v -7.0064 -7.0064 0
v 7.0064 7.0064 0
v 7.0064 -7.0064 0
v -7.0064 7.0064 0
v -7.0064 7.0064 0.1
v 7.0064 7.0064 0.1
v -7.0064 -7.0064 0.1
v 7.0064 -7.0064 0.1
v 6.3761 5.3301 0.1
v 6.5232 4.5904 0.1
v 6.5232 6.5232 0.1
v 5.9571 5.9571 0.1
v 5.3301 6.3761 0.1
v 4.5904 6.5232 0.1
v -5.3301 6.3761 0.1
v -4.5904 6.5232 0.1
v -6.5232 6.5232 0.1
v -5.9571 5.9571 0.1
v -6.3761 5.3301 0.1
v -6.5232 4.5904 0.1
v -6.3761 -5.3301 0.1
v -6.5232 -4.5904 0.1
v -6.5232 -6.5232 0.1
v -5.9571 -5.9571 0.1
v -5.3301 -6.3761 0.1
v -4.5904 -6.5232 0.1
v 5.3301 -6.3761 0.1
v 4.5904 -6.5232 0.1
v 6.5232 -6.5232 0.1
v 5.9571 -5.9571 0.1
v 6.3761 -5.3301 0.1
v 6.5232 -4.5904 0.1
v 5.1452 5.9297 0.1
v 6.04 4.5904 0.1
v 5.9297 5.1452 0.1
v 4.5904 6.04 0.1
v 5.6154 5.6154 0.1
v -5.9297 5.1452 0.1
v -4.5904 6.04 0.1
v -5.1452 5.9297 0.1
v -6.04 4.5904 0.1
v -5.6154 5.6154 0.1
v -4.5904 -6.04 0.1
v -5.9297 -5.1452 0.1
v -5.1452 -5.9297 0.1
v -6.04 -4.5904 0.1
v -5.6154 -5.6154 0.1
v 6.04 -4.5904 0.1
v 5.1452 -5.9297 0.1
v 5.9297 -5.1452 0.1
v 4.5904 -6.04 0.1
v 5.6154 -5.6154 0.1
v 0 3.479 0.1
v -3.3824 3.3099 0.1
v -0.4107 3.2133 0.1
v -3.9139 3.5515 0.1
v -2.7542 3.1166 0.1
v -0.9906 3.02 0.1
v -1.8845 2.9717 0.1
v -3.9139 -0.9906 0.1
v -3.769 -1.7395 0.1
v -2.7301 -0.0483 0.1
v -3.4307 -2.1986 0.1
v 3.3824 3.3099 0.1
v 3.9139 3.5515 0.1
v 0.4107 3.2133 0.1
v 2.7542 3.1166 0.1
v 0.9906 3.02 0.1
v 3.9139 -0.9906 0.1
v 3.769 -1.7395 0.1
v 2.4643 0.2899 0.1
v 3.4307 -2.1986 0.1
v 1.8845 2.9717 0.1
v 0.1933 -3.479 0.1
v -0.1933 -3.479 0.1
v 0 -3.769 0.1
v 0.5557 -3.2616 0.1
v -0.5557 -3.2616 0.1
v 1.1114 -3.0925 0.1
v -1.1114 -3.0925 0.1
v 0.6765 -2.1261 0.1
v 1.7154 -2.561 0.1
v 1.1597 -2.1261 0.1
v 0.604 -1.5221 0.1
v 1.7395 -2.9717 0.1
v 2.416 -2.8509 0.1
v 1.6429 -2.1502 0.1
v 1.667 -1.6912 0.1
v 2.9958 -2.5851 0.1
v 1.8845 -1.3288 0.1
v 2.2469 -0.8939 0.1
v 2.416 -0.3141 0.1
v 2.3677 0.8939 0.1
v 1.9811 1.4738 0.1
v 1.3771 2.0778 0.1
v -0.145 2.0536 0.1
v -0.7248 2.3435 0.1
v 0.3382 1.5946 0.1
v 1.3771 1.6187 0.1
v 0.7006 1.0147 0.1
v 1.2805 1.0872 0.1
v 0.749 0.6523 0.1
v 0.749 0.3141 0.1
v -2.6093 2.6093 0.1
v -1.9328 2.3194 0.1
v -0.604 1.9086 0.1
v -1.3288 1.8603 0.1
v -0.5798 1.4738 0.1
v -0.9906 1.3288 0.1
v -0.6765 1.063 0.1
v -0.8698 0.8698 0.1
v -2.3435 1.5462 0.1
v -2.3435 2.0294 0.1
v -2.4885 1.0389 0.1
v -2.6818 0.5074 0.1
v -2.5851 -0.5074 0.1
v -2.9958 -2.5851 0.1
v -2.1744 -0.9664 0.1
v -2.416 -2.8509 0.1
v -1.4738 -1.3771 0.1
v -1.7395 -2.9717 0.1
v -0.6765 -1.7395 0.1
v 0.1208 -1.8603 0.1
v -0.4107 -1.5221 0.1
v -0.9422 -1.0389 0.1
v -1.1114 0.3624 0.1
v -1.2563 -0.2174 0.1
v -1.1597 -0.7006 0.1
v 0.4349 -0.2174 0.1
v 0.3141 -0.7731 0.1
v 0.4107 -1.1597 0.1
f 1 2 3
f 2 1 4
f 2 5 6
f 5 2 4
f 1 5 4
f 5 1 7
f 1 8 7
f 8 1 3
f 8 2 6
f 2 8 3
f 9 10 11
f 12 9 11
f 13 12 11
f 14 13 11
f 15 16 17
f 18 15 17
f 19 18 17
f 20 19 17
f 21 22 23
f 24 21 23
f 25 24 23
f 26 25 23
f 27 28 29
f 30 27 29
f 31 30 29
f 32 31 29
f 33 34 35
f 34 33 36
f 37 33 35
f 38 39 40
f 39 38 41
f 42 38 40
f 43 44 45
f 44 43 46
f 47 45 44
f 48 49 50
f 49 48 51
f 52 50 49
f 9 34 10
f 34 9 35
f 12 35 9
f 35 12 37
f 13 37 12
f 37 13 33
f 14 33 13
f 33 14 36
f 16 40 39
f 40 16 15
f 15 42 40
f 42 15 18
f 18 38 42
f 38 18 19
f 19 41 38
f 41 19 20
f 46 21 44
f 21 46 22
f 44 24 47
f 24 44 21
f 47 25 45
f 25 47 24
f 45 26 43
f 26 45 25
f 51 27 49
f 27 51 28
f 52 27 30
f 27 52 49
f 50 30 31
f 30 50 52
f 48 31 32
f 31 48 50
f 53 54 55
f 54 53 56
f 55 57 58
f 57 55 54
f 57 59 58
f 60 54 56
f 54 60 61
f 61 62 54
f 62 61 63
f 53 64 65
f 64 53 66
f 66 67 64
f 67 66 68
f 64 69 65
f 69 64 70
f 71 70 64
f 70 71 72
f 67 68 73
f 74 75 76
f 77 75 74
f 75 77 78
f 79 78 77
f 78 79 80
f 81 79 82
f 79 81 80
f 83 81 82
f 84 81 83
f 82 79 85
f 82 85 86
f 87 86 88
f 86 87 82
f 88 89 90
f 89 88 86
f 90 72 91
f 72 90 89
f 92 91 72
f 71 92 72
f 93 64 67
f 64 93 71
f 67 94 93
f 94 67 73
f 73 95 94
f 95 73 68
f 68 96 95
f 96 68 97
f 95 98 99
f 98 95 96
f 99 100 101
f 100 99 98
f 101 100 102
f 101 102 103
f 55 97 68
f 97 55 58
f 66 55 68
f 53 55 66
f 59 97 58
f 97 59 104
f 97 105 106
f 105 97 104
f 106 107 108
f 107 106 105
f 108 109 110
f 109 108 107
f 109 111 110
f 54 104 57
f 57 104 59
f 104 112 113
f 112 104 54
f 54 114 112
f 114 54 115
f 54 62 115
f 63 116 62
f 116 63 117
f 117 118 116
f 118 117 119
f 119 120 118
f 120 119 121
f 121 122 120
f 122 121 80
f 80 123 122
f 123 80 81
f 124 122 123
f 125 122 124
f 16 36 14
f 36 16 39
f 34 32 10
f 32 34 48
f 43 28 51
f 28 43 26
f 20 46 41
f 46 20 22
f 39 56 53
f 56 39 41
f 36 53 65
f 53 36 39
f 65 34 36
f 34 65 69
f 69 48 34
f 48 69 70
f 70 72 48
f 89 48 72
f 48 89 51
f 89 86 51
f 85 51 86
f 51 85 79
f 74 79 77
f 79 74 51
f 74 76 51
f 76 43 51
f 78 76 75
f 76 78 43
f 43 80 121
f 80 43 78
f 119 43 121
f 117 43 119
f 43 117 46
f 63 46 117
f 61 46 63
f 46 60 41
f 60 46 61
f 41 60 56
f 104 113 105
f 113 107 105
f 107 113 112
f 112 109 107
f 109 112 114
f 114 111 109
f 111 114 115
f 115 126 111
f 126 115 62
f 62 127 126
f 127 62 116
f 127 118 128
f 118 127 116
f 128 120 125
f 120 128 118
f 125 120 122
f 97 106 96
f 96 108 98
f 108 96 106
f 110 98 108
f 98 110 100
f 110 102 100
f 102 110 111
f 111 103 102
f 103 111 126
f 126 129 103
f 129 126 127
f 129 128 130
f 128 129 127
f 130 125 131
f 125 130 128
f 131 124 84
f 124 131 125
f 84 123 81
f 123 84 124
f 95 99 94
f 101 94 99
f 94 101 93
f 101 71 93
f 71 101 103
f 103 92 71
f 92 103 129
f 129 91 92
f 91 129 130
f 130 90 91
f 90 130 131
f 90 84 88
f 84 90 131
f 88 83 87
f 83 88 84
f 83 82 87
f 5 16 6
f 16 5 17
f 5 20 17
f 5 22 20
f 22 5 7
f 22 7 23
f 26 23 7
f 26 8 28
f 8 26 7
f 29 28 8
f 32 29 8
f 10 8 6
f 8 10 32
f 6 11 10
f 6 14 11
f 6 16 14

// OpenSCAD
// file: ../p/box5-12.scad
use <../lib.scad>
function ldraw_lib__box5_12() = [
// 0 Box with 5 Faces without Any Edges
// 0 Name: box5-12.dat
// 0 Author: Chris Dee [cwdee]
// 0 !LDRAW_ORG Primitive UPDATE 2009-02
// 0 !LICENSE Licensed under CC BY 4.0 : see CAreadme.txt
// 
// 0 BFC CERTIFY CCW
  [0,"BFC","CERTIFY"],
  [0,"BFC","CCW"],
// 
// 0 !HISTORY 2009-09-03 [PTadmin] Official Update 2009-02
// 
// 
// 4 16 1 1 1 1 1 -1 -1 1 -1 -1 1 1
  [4,16,1,1,1,1,1,-1,-1,1,-1,-1,1,1],
// 4 16 -1 0 1 1 0 1 1 1 1 -1 1 1
  [4,16,-1,0,1,1,0,1,1,1,1,-1,1,1],
// 4 16 -1 0 -1 -1 0 1 -1 1 1 -1 1 -1
  [4,16,-1,0,-1,-1,0,1,-1,1,1,-1,1,-1],
// 4 16 1 0 -1 -1 0 -1 -1 1 -1 1 1 -1
  [4,16,1,0,-1,-1,0,-1,-1,1,-1,1,1,-1],
// 4 16 1 0 1 1 0 -1 1 1 -1 1 1 1
  [4,16,1,0,1,1,0,-1,1,1,-1,1,1,1],
// 0
];
module ldraw_lib__box5_12(step=0, col=false, unit=2/5, alt=false, line=0.2, solid=!$preview)
    makepoly(ldraw_lib__box5_12(), step=step, col=col, unit=unit, alt=alt, line=line, solid=solid);
ldraw_lib__box5_12(line=0.2);
// file: ../p/1-4ring3.scad
use <../lib.scad>
function ldraw_lib__1_4ring3() = [
// 0 Ring  3 x 0.25
// 0 Name: 1-4ring3.dat
// 0 Author: Willy Tschager [Holly-Wood]
// 0 !LDRAW_ORG Primitive UPDATE 2024-01
// 0 !LICENSE Licensed under CC BY 4.0 : see CAreadme.txt
// 
// 0 BFC CERTIFY CCW
  [0,"BFC","CERTIFY"],
  [0,"BFC","CCW"],
// 
// 0 !HISTORY 1999-07-05 [PTadmin] Official Update 1999-05
// 0 !HISTORY 2003-01-21 [cavehop] Update Added BFC and 1 digit of significance
// 0 !HISTORY 2003-05-21 [cavehop] Corrected values as indicated by pneaster
// 0 !HISTORY 2003-06-12 [cavehop] Re-corrected values as indicated by pneaster
// 0 !HISTORY 2003-08-01 [PTadmin] Official Update 2003-02
// 0 !HISTORY 2007-06-22 [PTadmin] Header formatted for Contributor Agreement
// 0 !HISTORY 2008-07-01 [PTadmin] Official Update 2008-01
// 0 !HISTORY 2012-02-16 [Philo] Changed to CCW
// 0 !HISTORY 2012-03-30 [PTadmin] Official Update 2012-01
// 0 !HISTORY 2024-01-04 [Holly-Wood] Complete re-write, original by Karim Nassar
// 0 !HISTORY 2024-01-29 [OrionP] Official Update 2024-01
// 
// 4 16 4 0 0 3.6956 0 1.5308 2.7717 0 1.1481 3 0 0
  [4,16,4,0,0,3.6956,0,1.5308,2.7717,0,1.1481,3,0,0],
// 4 16 3.6956 0 1.5308 2.8284 0 2.8284 2.1213 0 2.1213 2.7717 0 1.1481
  [4,16,3.6956,0,1.5308,2.8284,0,2.8284,2.1213,0,2.1213,2.7717,0,1.1481],
// 4 16 2.8284 0 2.8284 1.5308 0 3.6956 1.1481 0 2.7717 2.1213 0 2.1213
  [4,16,2.8284,0,2.8284,1.5308,0,3.6956,1.1481,0,2.7717,2.1213,0,2.1213],
// 4 16 1.5308 0 3.6956 0 0 4 0 0 3 1.1481 0 2.7717
  [4,16,1.5308,0,3.6956,0,0,4,0,0,3,1.1481,0,2.7717],
// 0 // Build by LDPartEditor (PrimGen 2.X)
];
module ldraw_lib__1_4ring3(step=0, col=false, unit=2/5, alt=false, line=0.2, solid=!$preview)
    makepoly(ldraw_lib__1_4ring3(), step=step, col=col, unit=unit, alt=alt, line=line, solid=solid);
ldraw_lib__1_4ring3(line=0.2);
// file: ../p/1-4ndis.scad
use <../lib.scad>
function ldraw_lib__1_4ndis() = [
// 0 Disc Negative 0.25
// 0 Name: 1-4ndis.dat
// 0 Author: James Jessiman
// 0 !LDRAW_ORG Primitive UPDATE 2012-01
// 0 !LICENSE Licensed under CC BY 4.0 : see CAreadme.txt
// 
// 0 BFC CERTIFY CCW
  [0,"BFC","CERTIFY"],
  [0,"BFC","CCW"],
// 
// 0 !HISTORY 2002-03-23 [sbliss] Added BFC Statement
// 0 !HISTORY 2002-04-25 [PTadmin] Official Update 2002-02
// 0 !HISTORY 2007-06-22 [PTadmin] Header formatted for Contributor Agreement
// 0 !HISTORY 2008-07-01 [PTadmin] Official Update 2008-01
// 0 !HISTORY 2012-02-16 [Philo] Changed to CCW
// 0 !HISTORY 2012-03-30 [PTadmin] Official Update 2012-01
// 
// 
// 3 16 0.9239 0 0.3827 1 0 0 1 0 1
  [3,16,0.9239,0,0.3827,1,0,0,1,0,1],
// 3 16 0.7071 0 0.7071 0.9239 0 0.3827 1 0 1
  [3,16,0.7071,0,0.7071,0.9239,0,0.3827,1,0,1],
// 3 16 0.3827 0 0.9239 0.7071 0 0.7071 1 0 1
  [3,16,0.3827,0,0.9239,0.7071,0,0.7071,1,0,1],
// 3 16 0 0 1 0.3827 0 0.9239 1 0 1
  [3,16,0,0,1,0.3827,0,0.9239,1,0,1],
];
module ldraw_lib__1_4ndis(step=0, col=false, unit=2/5, alt=false, line=0.2, solid=!$preview)
    makepoly(ldraw_lib__1_4ndis(), step=step, col=col, unit=unit, alt=alt, line=line, solid=solid);
ldraw_lib__1_4ndis(line=0.2);
// file: ../p/1-4chrd.scad
use <../lib.scad>
function ldraw_lib__1_4chrd() = [
// 0 Chord 0.25
// 0 Name: 1-4chrd.dat
// 0 Author: Max Martin Richter [MMR1988]
// 0 !LDRAW_ORG Primitive UPDATE 2023-05
// 0 !LICENSE Licensed under CC BY 4.0 : see CAreadme.txt
// 
// 0 BFC CERTIFY CCW
  [0,"BFC","CERTIFY"],
  [0,"BFC","CCW"],
// 
// 0 !HISTORY 2004-04-22 [PTadmin] Official Update 2004-02
// 0 !HISTORY 2007-10-09 [PTadmin] Header formatted for Contributor Agreement
// 0 !HISTORY 2008-07-01 [PTadmin] Official Update 2008-01
// 0 !HISTORY 2012-08-02 [MMR1988] Re-creation with PrimGen2 and Rectifier
// 0 !HISTORY 2012-08-09 [PTadmin] Official Update 2012-02
// 0 !HISTORY 2023-10-27 [OrionP] Change author to MMR1988 from hafhead
// 0 !HISTORY 2023-10-31 [OrionP] Official Update 2023-05
// 
// 4 16 0.9239 0 0.3827 0.3827 0 0.9239 0 0 1 1 0 0
  [4,16,0.9239,0,0.3827,0.3827,0,0.9239,0,0,1,1,0,0],
// 3 16 0.7071 0 0.7071 0.3827 0 0.9239 0.9239 0 0.3827
  [3,16,0.7071,0,0.7071,0.3827,0,0.9239,0.9239,0,0.3827],
];
module ldraw_lib__1_4chrd(step=0, col=false, unit=2/5, alt=false, line=0.2, solid=!$preview)
    makepoly(ldraw_lib__1_4chrd(), step=step, col=col, unit=unit, alt=alt, line=line, solid=solid);
ldraw_lib__1_4chrd(line=0.2);
// main file
use <../lib.scad>
use <168135h.scad>
function ldraw_lib__169575b() = [
// 0 Sticker  1.8 x  1.8 with Fire Logo Badge
// 0 Name: 169575b.dat
// 0 Author: Chris Böhnke [KnightOfTarenta]
// 0 !LDRAW_ORG Part UPDATE 2026-05
// 0 !LICENSE Licensed under CC BY 4.0 : see CAreadme.txt
// 
// 0 BFC CERTIFY CCW
  [0,"BFC","CERTIFY"],
  [0,"BFC","CCW"],
// 
// 0 !KEYWORDS Blaze Commander, Bricklink 6525stk01, BrickOwl 218159, Fire 1994
// 0 !KEYWORDS Fire Fighters, Fire Station, Rebrickable 169575, Set 6525, town
// 
// 0 !HISTORY 2026-05-31 [OrionP] Official Update 2026-05
// 
// 0 // Using 168135h.dat by Takeshi Takahashi [RainbowDolphin]
// 1 16 0 0 0 .604 0 0 0 1 0 0 0 .604 168135h.dat
  [1,16,0,0,0,.604,0,0,0,1,0,0,0,.604, ldraw_lib__168135h()],
];
module ldraw_lib__169575b(step=0, col=false, unit=2/5, alt=false, line=0.2, solid=!$preview)
    makepoly(ldraw_lib__169575b(), step=step, col=col, unit=unit, alt=alt, line=line, solid=solid);
ldraw_lib__169575b(line=0.2);
